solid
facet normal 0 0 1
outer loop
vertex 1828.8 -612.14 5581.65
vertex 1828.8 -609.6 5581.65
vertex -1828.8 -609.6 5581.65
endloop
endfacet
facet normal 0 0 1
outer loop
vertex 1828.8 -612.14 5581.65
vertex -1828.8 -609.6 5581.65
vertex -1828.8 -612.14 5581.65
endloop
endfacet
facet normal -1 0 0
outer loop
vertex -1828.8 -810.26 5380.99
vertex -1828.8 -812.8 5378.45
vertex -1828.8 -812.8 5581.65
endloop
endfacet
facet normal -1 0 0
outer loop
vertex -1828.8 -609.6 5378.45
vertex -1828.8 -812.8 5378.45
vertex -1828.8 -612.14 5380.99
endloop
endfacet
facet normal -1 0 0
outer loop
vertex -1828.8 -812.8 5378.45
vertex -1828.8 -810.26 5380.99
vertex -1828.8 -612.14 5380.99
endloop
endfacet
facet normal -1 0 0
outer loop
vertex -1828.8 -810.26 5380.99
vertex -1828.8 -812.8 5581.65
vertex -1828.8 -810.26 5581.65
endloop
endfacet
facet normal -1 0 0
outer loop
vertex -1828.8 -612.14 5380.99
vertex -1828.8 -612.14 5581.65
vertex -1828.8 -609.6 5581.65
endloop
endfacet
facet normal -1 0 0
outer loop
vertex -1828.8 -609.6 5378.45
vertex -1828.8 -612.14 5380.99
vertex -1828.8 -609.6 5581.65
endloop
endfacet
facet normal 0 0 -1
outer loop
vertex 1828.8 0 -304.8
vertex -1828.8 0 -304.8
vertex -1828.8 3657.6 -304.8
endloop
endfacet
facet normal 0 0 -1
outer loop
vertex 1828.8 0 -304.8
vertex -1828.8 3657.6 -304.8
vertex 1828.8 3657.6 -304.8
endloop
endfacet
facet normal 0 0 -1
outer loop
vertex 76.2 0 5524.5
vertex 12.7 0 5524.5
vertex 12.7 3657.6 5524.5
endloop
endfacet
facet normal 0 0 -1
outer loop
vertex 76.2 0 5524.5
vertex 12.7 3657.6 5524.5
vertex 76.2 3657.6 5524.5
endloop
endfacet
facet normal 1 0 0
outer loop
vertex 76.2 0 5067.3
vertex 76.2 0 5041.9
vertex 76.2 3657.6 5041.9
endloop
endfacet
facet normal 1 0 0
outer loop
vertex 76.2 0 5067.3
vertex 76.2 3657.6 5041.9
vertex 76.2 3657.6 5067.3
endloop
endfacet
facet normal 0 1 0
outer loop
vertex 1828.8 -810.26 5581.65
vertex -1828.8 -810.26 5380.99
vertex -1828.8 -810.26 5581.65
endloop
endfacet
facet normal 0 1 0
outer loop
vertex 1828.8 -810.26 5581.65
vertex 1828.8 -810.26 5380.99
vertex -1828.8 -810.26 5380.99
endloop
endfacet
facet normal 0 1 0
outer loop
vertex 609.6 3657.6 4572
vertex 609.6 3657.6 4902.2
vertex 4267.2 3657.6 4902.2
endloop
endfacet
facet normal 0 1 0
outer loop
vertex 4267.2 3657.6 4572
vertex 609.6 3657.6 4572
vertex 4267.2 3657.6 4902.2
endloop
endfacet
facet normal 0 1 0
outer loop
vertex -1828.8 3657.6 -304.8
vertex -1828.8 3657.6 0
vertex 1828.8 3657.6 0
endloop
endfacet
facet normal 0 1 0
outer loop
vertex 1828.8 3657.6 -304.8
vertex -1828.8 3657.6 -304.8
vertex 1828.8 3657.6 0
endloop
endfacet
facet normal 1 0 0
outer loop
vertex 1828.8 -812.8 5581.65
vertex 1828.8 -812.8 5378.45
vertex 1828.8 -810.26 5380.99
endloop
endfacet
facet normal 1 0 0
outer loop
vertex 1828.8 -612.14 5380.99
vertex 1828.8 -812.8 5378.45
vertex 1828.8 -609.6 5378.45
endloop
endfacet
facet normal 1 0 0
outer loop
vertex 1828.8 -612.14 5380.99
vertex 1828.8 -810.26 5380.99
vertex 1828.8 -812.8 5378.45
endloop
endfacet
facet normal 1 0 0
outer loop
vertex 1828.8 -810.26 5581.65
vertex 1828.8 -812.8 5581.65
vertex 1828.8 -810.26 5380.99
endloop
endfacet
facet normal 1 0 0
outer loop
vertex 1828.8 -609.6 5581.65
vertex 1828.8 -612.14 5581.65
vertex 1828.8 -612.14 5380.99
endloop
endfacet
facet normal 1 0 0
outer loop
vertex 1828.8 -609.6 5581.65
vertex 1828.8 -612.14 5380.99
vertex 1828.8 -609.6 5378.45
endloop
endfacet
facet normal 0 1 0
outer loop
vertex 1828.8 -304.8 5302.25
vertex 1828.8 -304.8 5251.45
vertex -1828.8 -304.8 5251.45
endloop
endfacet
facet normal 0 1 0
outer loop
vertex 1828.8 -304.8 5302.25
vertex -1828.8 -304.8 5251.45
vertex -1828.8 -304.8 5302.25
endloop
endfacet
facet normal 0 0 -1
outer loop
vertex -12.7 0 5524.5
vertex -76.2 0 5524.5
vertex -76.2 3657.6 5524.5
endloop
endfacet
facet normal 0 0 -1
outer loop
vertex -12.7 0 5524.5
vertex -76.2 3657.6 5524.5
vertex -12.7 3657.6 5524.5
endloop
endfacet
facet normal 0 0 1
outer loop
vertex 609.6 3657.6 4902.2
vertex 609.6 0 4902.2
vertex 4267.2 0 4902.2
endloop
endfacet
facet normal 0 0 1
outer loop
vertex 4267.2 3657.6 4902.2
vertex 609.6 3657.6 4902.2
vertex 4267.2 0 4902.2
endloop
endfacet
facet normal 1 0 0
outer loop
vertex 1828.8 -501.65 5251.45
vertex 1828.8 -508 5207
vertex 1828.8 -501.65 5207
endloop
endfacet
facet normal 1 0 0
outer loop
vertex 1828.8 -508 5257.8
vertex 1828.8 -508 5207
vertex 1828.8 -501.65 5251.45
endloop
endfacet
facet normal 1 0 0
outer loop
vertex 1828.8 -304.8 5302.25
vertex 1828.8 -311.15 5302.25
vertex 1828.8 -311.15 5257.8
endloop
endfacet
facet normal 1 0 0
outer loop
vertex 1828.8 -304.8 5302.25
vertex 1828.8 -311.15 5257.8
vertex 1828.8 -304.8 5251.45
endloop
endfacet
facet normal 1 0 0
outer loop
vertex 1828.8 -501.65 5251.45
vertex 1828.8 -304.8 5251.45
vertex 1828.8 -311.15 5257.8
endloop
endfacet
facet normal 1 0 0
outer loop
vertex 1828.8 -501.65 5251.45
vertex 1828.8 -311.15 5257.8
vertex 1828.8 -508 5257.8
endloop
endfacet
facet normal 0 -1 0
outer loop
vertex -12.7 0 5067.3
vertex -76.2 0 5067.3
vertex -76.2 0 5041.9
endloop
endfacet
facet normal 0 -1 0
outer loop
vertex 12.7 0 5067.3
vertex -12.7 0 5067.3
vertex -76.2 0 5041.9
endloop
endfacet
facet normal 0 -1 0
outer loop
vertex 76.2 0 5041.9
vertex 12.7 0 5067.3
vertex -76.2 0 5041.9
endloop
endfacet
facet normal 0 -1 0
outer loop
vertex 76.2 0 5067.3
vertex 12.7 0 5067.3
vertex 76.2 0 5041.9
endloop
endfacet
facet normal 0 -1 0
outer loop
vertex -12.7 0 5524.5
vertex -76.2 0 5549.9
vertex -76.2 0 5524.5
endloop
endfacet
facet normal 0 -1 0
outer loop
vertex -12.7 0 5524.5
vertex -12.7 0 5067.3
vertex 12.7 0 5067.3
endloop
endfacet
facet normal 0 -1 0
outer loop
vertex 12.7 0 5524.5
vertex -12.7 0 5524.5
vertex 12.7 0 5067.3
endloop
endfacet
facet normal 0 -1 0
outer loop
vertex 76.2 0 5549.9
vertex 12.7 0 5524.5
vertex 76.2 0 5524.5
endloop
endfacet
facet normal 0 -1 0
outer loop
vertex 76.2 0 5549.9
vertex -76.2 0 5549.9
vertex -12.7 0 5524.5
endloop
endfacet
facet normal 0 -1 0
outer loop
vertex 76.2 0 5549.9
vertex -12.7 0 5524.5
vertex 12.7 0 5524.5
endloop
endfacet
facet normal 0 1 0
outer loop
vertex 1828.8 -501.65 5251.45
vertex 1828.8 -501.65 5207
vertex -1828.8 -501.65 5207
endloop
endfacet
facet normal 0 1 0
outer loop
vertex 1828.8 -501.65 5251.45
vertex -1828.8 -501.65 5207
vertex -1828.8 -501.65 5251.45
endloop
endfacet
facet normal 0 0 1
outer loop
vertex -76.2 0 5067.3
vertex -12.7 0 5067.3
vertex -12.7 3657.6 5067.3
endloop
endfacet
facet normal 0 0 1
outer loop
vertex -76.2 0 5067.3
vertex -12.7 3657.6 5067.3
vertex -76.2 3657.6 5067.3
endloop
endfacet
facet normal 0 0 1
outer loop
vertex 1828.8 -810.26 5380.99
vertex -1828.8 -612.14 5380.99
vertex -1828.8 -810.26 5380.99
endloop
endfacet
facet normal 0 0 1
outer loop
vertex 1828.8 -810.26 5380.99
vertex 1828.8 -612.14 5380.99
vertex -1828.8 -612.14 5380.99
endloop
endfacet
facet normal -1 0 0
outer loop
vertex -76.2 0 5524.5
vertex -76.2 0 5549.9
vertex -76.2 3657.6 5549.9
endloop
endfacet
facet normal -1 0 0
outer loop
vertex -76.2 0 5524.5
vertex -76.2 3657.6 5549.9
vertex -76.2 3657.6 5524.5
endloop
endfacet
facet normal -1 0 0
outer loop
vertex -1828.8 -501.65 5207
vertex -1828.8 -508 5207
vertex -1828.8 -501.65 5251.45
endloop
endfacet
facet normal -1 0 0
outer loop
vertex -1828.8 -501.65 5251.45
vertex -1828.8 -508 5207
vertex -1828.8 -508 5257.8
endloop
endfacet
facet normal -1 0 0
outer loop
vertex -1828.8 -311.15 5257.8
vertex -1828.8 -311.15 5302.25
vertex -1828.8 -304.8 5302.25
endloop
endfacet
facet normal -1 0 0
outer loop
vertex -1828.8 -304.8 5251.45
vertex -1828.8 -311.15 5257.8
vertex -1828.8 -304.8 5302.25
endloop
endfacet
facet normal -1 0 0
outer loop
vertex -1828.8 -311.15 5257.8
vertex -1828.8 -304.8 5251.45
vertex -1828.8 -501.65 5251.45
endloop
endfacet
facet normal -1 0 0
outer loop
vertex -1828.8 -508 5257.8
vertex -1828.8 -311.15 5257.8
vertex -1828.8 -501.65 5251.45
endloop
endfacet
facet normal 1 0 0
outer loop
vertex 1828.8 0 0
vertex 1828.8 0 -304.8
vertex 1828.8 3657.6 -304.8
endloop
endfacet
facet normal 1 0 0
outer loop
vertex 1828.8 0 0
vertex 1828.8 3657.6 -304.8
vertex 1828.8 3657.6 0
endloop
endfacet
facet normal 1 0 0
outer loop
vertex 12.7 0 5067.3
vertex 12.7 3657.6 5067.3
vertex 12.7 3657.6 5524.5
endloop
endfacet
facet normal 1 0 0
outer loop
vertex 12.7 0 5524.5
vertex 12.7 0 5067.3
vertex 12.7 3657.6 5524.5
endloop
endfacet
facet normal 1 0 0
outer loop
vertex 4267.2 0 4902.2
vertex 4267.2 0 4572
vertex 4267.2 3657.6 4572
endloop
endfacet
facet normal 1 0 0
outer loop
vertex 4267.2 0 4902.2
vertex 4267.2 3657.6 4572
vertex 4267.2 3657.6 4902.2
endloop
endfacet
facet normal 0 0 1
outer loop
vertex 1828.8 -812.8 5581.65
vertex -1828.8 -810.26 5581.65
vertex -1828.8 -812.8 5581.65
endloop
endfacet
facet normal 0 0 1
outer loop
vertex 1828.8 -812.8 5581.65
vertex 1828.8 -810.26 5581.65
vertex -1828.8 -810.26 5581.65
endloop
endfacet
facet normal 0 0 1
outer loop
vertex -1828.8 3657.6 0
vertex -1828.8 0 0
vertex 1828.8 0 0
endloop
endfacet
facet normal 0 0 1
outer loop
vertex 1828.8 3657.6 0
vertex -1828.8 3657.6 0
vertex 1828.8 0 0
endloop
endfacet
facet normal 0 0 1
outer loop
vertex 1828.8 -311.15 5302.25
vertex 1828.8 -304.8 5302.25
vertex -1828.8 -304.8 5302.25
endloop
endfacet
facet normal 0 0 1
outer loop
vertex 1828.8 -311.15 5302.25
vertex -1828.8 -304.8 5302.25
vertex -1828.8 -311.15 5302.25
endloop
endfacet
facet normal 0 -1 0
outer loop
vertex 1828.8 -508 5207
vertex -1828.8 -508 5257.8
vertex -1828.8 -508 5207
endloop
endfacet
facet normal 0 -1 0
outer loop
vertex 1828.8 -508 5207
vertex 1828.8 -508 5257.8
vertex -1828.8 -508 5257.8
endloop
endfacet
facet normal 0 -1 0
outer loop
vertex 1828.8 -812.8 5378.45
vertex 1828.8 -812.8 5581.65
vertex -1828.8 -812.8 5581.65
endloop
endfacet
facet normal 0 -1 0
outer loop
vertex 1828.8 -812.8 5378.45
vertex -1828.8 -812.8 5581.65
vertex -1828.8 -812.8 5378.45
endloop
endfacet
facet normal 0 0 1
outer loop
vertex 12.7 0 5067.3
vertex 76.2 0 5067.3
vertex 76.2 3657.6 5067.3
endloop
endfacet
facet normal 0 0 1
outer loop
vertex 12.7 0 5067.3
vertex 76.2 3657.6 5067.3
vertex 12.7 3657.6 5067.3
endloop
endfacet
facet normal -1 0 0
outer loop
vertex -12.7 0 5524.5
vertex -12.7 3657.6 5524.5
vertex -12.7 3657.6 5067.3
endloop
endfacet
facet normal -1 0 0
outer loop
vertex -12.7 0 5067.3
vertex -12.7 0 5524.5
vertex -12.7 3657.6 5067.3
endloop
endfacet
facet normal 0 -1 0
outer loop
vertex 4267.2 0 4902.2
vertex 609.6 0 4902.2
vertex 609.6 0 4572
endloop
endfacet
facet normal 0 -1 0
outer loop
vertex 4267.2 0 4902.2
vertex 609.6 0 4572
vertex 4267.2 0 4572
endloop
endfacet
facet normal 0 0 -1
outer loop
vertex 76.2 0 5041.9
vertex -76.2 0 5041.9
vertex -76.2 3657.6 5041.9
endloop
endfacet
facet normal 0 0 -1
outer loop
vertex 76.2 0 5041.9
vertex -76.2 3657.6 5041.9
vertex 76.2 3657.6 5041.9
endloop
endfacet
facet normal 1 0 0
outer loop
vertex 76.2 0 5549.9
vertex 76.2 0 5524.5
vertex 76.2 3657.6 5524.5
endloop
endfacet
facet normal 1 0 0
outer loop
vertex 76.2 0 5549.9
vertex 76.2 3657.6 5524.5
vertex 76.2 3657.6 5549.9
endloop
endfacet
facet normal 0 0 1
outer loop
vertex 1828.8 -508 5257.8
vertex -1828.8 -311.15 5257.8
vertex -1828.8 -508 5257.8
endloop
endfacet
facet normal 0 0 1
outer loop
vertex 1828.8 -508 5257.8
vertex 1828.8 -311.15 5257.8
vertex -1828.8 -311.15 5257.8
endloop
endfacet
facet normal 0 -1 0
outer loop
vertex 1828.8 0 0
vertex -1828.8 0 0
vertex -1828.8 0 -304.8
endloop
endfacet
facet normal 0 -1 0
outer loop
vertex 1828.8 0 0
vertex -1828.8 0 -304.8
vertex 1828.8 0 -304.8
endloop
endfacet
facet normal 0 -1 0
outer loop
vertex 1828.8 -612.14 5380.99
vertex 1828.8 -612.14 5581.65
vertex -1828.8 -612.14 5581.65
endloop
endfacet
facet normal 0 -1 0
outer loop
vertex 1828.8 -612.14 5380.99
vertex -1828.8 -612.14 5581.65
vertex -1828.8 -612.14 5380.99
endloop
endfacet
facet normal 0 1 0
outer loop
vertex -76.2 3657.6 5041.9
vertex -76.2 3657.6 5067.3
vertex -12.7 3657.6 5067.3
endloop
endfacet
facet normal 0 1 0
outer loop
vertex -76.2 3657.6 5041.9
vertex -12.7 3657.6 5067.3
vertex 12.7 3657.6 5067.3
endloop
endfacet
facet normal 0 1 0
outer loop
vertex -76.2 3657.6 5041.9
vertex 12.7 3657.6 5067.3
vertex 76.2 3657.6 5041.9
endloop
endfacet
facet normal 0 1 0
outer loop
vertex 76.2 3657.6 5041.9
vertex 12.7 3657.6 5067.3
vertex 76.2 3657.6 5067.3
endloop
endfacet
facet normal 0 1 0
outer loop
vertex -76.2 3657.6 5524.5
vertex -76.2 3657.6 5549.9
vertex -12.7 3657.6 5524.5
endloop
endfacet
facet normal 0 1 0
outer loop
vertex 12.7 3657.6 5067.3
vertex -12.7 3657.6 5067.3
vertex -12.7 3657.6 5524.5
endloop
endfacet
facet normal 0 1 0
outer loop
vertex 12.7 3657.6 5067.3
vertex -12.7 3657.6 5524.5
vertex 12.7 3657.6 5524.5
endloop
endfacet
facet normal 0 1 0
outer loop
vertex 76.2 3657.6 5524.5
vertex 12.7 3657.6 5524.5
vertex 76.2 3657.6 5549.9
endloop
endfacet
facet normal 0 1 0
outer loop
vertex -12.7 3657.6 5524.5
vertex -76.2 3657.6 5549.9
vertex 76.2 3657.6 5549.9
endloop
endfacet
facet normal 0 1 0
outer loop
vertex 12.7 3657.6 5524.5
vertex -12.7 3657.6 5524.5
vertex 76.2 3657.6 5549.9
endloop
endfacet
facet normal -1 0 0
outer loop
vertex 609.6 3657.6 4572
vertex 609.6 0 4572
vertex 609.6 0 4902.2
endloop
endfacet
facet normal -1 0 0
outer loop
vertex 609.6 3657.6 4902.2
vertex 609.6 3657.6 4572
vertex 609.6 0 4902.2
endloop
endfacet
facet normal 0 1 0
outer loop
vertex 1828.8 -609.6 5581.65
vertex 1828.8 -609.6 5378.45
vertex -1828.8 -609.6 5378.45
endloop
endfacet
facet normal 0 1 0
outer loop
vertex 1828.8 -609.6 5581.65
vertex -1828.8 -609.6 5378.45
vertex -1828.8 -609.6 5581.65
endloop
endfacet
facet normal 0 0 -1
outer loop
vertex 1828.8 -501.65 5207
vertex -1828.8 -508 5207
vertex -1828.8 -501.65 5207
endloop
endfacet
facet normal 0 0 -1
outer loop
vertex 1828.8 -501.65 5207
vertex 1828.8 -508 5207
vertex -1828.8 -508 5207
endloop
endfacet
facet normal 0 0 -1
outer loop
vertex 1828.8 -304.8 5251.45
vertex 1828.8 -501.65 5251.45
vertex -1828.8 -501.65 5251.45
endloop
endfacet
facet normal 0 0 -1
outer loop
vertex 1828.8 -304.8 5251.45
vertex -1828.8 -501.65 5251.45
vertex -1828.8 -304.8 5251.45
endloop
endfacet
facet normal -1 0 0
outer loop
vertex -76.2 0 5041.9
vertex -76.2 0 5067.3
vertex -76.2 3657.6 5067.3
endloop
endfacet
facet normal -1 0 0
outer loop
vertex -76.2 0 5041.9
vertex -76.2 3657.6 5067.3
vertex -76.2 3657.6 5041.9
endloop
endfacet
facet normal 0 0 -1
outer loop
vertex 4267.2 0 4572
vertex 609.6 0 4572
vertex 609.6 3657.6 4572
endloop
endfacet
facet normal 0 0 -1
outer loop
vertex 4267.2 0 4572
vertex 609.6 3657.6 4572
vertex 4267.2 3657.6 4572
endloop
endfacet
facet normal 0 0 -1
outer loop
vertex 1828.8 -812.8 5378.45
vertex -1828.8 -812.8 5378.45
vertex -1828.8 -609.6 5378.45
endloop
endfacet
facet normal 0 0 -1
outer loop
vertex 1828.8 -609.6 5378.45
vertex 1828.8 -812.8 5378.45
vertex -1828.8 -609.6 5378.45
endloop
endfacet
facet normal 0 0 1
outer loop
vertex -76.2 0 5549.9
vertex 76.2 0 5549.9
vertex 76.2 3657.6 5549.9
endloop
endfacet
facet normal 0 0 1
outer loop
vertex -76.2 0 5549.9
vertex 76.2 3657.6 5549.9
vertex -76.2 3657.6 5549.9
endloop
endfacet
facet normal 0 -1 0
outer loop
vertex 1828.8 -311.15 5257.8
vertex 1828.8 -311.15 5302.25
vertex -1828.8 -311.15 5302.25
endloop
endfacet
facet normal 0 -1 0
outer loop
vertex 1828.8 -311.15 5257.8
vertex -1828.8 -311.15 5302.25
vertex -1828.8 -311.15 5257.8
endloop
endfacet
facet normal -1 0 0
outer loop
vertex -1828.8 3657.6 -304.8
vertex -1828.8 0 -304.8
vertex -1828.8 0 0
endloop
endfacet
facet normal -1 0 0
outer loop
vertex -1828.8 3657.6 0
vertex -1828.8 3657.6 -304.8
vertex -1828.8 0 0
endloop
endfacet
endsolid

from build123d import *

# Parameters (mm, degrees)
F0_W     = 3657.6
F0_H     = 304.8
F1_DEPTH = 3657.6
F3_DEPTH = 3657.6
F5_DEPTH = 1828.8
F7_DEPTH = 1828.8
F8_W     = 3657.6
F8_H     = 330.2
F9_DEPTH = 3657.6


with BuildPart() as f1:
    # F0 (on Front) → F1 (new body)
    with BuildSketch(Plane.XZ):
        with Locations((0, -152.4)):
            Rectangle(F0_W, F0_H)
    extrude(amount=-F1_DEPTH)


with BuildPart() as f3:
    # F2 (on Front) → F3 (new body)
    with BuildSketch(Plane.XZ):
        Polygon((76.2, 5549.9), (0, 5549.9), (-76.2, 5549.9), (-76.2, 5524.5), (-12.7, 5524.5), (-12.7, 5067.3), (-76.2, 5067.3), (-76.2, 5041.9), (0, 5041.9), (76.2, 5041.9), (76.2, 5067.3), (12.7, 5067.3), (12.7, 5524.5), (76.2, 5524.5), align=None)
    extrude(amount=-F3_DEPTH)


with BuildPart() as f5:
    # F4 (on Right) → F5 (new body, symmetric)
    with BuildSketch(Plane.YZ):
        Polygon((-508, 5251.45), (-508, 5207), (-501.65, 5207), (-501.65, 5251.45), (-311.15, 5251.45), (-304.8, 5251.45), (-304.8, 5302.25), (-311.15, 5302.25), (-311.15, 5257.8), (-508, 5257.8), align=None)
    extrude(amount=F5_DEPTH, both=True)


with BuildPart() as f7:
    # F6 (on Right) → F7 (new body, symmetric)
    with BuildSketch(Plane.YZ):
        Polygon((-810.26, 5581.65), (-812.8, 5581.65), (-812.8, 5378.45), (-609.6, 5378.45), (-609.6, 5581.65), (-612.14, 5581.65), (-612.14, 5380.99), (-810.26, 5380.99), align=None)
    extrude(amount=F7_DEPTH, both=True)


with BuildPart() as f9:
    # F8 (on Front) → F9 (new body)
    with BuildSketch(Plane.XZ):
        with Locations((2438.4, 4737.1)):
            Rectangle(F8_W, F8_H)
    extrude(amount=-F9_DEPTH)


solid = Compound([f1.part, f3.part, f5.part, f7.part, f9.part])
